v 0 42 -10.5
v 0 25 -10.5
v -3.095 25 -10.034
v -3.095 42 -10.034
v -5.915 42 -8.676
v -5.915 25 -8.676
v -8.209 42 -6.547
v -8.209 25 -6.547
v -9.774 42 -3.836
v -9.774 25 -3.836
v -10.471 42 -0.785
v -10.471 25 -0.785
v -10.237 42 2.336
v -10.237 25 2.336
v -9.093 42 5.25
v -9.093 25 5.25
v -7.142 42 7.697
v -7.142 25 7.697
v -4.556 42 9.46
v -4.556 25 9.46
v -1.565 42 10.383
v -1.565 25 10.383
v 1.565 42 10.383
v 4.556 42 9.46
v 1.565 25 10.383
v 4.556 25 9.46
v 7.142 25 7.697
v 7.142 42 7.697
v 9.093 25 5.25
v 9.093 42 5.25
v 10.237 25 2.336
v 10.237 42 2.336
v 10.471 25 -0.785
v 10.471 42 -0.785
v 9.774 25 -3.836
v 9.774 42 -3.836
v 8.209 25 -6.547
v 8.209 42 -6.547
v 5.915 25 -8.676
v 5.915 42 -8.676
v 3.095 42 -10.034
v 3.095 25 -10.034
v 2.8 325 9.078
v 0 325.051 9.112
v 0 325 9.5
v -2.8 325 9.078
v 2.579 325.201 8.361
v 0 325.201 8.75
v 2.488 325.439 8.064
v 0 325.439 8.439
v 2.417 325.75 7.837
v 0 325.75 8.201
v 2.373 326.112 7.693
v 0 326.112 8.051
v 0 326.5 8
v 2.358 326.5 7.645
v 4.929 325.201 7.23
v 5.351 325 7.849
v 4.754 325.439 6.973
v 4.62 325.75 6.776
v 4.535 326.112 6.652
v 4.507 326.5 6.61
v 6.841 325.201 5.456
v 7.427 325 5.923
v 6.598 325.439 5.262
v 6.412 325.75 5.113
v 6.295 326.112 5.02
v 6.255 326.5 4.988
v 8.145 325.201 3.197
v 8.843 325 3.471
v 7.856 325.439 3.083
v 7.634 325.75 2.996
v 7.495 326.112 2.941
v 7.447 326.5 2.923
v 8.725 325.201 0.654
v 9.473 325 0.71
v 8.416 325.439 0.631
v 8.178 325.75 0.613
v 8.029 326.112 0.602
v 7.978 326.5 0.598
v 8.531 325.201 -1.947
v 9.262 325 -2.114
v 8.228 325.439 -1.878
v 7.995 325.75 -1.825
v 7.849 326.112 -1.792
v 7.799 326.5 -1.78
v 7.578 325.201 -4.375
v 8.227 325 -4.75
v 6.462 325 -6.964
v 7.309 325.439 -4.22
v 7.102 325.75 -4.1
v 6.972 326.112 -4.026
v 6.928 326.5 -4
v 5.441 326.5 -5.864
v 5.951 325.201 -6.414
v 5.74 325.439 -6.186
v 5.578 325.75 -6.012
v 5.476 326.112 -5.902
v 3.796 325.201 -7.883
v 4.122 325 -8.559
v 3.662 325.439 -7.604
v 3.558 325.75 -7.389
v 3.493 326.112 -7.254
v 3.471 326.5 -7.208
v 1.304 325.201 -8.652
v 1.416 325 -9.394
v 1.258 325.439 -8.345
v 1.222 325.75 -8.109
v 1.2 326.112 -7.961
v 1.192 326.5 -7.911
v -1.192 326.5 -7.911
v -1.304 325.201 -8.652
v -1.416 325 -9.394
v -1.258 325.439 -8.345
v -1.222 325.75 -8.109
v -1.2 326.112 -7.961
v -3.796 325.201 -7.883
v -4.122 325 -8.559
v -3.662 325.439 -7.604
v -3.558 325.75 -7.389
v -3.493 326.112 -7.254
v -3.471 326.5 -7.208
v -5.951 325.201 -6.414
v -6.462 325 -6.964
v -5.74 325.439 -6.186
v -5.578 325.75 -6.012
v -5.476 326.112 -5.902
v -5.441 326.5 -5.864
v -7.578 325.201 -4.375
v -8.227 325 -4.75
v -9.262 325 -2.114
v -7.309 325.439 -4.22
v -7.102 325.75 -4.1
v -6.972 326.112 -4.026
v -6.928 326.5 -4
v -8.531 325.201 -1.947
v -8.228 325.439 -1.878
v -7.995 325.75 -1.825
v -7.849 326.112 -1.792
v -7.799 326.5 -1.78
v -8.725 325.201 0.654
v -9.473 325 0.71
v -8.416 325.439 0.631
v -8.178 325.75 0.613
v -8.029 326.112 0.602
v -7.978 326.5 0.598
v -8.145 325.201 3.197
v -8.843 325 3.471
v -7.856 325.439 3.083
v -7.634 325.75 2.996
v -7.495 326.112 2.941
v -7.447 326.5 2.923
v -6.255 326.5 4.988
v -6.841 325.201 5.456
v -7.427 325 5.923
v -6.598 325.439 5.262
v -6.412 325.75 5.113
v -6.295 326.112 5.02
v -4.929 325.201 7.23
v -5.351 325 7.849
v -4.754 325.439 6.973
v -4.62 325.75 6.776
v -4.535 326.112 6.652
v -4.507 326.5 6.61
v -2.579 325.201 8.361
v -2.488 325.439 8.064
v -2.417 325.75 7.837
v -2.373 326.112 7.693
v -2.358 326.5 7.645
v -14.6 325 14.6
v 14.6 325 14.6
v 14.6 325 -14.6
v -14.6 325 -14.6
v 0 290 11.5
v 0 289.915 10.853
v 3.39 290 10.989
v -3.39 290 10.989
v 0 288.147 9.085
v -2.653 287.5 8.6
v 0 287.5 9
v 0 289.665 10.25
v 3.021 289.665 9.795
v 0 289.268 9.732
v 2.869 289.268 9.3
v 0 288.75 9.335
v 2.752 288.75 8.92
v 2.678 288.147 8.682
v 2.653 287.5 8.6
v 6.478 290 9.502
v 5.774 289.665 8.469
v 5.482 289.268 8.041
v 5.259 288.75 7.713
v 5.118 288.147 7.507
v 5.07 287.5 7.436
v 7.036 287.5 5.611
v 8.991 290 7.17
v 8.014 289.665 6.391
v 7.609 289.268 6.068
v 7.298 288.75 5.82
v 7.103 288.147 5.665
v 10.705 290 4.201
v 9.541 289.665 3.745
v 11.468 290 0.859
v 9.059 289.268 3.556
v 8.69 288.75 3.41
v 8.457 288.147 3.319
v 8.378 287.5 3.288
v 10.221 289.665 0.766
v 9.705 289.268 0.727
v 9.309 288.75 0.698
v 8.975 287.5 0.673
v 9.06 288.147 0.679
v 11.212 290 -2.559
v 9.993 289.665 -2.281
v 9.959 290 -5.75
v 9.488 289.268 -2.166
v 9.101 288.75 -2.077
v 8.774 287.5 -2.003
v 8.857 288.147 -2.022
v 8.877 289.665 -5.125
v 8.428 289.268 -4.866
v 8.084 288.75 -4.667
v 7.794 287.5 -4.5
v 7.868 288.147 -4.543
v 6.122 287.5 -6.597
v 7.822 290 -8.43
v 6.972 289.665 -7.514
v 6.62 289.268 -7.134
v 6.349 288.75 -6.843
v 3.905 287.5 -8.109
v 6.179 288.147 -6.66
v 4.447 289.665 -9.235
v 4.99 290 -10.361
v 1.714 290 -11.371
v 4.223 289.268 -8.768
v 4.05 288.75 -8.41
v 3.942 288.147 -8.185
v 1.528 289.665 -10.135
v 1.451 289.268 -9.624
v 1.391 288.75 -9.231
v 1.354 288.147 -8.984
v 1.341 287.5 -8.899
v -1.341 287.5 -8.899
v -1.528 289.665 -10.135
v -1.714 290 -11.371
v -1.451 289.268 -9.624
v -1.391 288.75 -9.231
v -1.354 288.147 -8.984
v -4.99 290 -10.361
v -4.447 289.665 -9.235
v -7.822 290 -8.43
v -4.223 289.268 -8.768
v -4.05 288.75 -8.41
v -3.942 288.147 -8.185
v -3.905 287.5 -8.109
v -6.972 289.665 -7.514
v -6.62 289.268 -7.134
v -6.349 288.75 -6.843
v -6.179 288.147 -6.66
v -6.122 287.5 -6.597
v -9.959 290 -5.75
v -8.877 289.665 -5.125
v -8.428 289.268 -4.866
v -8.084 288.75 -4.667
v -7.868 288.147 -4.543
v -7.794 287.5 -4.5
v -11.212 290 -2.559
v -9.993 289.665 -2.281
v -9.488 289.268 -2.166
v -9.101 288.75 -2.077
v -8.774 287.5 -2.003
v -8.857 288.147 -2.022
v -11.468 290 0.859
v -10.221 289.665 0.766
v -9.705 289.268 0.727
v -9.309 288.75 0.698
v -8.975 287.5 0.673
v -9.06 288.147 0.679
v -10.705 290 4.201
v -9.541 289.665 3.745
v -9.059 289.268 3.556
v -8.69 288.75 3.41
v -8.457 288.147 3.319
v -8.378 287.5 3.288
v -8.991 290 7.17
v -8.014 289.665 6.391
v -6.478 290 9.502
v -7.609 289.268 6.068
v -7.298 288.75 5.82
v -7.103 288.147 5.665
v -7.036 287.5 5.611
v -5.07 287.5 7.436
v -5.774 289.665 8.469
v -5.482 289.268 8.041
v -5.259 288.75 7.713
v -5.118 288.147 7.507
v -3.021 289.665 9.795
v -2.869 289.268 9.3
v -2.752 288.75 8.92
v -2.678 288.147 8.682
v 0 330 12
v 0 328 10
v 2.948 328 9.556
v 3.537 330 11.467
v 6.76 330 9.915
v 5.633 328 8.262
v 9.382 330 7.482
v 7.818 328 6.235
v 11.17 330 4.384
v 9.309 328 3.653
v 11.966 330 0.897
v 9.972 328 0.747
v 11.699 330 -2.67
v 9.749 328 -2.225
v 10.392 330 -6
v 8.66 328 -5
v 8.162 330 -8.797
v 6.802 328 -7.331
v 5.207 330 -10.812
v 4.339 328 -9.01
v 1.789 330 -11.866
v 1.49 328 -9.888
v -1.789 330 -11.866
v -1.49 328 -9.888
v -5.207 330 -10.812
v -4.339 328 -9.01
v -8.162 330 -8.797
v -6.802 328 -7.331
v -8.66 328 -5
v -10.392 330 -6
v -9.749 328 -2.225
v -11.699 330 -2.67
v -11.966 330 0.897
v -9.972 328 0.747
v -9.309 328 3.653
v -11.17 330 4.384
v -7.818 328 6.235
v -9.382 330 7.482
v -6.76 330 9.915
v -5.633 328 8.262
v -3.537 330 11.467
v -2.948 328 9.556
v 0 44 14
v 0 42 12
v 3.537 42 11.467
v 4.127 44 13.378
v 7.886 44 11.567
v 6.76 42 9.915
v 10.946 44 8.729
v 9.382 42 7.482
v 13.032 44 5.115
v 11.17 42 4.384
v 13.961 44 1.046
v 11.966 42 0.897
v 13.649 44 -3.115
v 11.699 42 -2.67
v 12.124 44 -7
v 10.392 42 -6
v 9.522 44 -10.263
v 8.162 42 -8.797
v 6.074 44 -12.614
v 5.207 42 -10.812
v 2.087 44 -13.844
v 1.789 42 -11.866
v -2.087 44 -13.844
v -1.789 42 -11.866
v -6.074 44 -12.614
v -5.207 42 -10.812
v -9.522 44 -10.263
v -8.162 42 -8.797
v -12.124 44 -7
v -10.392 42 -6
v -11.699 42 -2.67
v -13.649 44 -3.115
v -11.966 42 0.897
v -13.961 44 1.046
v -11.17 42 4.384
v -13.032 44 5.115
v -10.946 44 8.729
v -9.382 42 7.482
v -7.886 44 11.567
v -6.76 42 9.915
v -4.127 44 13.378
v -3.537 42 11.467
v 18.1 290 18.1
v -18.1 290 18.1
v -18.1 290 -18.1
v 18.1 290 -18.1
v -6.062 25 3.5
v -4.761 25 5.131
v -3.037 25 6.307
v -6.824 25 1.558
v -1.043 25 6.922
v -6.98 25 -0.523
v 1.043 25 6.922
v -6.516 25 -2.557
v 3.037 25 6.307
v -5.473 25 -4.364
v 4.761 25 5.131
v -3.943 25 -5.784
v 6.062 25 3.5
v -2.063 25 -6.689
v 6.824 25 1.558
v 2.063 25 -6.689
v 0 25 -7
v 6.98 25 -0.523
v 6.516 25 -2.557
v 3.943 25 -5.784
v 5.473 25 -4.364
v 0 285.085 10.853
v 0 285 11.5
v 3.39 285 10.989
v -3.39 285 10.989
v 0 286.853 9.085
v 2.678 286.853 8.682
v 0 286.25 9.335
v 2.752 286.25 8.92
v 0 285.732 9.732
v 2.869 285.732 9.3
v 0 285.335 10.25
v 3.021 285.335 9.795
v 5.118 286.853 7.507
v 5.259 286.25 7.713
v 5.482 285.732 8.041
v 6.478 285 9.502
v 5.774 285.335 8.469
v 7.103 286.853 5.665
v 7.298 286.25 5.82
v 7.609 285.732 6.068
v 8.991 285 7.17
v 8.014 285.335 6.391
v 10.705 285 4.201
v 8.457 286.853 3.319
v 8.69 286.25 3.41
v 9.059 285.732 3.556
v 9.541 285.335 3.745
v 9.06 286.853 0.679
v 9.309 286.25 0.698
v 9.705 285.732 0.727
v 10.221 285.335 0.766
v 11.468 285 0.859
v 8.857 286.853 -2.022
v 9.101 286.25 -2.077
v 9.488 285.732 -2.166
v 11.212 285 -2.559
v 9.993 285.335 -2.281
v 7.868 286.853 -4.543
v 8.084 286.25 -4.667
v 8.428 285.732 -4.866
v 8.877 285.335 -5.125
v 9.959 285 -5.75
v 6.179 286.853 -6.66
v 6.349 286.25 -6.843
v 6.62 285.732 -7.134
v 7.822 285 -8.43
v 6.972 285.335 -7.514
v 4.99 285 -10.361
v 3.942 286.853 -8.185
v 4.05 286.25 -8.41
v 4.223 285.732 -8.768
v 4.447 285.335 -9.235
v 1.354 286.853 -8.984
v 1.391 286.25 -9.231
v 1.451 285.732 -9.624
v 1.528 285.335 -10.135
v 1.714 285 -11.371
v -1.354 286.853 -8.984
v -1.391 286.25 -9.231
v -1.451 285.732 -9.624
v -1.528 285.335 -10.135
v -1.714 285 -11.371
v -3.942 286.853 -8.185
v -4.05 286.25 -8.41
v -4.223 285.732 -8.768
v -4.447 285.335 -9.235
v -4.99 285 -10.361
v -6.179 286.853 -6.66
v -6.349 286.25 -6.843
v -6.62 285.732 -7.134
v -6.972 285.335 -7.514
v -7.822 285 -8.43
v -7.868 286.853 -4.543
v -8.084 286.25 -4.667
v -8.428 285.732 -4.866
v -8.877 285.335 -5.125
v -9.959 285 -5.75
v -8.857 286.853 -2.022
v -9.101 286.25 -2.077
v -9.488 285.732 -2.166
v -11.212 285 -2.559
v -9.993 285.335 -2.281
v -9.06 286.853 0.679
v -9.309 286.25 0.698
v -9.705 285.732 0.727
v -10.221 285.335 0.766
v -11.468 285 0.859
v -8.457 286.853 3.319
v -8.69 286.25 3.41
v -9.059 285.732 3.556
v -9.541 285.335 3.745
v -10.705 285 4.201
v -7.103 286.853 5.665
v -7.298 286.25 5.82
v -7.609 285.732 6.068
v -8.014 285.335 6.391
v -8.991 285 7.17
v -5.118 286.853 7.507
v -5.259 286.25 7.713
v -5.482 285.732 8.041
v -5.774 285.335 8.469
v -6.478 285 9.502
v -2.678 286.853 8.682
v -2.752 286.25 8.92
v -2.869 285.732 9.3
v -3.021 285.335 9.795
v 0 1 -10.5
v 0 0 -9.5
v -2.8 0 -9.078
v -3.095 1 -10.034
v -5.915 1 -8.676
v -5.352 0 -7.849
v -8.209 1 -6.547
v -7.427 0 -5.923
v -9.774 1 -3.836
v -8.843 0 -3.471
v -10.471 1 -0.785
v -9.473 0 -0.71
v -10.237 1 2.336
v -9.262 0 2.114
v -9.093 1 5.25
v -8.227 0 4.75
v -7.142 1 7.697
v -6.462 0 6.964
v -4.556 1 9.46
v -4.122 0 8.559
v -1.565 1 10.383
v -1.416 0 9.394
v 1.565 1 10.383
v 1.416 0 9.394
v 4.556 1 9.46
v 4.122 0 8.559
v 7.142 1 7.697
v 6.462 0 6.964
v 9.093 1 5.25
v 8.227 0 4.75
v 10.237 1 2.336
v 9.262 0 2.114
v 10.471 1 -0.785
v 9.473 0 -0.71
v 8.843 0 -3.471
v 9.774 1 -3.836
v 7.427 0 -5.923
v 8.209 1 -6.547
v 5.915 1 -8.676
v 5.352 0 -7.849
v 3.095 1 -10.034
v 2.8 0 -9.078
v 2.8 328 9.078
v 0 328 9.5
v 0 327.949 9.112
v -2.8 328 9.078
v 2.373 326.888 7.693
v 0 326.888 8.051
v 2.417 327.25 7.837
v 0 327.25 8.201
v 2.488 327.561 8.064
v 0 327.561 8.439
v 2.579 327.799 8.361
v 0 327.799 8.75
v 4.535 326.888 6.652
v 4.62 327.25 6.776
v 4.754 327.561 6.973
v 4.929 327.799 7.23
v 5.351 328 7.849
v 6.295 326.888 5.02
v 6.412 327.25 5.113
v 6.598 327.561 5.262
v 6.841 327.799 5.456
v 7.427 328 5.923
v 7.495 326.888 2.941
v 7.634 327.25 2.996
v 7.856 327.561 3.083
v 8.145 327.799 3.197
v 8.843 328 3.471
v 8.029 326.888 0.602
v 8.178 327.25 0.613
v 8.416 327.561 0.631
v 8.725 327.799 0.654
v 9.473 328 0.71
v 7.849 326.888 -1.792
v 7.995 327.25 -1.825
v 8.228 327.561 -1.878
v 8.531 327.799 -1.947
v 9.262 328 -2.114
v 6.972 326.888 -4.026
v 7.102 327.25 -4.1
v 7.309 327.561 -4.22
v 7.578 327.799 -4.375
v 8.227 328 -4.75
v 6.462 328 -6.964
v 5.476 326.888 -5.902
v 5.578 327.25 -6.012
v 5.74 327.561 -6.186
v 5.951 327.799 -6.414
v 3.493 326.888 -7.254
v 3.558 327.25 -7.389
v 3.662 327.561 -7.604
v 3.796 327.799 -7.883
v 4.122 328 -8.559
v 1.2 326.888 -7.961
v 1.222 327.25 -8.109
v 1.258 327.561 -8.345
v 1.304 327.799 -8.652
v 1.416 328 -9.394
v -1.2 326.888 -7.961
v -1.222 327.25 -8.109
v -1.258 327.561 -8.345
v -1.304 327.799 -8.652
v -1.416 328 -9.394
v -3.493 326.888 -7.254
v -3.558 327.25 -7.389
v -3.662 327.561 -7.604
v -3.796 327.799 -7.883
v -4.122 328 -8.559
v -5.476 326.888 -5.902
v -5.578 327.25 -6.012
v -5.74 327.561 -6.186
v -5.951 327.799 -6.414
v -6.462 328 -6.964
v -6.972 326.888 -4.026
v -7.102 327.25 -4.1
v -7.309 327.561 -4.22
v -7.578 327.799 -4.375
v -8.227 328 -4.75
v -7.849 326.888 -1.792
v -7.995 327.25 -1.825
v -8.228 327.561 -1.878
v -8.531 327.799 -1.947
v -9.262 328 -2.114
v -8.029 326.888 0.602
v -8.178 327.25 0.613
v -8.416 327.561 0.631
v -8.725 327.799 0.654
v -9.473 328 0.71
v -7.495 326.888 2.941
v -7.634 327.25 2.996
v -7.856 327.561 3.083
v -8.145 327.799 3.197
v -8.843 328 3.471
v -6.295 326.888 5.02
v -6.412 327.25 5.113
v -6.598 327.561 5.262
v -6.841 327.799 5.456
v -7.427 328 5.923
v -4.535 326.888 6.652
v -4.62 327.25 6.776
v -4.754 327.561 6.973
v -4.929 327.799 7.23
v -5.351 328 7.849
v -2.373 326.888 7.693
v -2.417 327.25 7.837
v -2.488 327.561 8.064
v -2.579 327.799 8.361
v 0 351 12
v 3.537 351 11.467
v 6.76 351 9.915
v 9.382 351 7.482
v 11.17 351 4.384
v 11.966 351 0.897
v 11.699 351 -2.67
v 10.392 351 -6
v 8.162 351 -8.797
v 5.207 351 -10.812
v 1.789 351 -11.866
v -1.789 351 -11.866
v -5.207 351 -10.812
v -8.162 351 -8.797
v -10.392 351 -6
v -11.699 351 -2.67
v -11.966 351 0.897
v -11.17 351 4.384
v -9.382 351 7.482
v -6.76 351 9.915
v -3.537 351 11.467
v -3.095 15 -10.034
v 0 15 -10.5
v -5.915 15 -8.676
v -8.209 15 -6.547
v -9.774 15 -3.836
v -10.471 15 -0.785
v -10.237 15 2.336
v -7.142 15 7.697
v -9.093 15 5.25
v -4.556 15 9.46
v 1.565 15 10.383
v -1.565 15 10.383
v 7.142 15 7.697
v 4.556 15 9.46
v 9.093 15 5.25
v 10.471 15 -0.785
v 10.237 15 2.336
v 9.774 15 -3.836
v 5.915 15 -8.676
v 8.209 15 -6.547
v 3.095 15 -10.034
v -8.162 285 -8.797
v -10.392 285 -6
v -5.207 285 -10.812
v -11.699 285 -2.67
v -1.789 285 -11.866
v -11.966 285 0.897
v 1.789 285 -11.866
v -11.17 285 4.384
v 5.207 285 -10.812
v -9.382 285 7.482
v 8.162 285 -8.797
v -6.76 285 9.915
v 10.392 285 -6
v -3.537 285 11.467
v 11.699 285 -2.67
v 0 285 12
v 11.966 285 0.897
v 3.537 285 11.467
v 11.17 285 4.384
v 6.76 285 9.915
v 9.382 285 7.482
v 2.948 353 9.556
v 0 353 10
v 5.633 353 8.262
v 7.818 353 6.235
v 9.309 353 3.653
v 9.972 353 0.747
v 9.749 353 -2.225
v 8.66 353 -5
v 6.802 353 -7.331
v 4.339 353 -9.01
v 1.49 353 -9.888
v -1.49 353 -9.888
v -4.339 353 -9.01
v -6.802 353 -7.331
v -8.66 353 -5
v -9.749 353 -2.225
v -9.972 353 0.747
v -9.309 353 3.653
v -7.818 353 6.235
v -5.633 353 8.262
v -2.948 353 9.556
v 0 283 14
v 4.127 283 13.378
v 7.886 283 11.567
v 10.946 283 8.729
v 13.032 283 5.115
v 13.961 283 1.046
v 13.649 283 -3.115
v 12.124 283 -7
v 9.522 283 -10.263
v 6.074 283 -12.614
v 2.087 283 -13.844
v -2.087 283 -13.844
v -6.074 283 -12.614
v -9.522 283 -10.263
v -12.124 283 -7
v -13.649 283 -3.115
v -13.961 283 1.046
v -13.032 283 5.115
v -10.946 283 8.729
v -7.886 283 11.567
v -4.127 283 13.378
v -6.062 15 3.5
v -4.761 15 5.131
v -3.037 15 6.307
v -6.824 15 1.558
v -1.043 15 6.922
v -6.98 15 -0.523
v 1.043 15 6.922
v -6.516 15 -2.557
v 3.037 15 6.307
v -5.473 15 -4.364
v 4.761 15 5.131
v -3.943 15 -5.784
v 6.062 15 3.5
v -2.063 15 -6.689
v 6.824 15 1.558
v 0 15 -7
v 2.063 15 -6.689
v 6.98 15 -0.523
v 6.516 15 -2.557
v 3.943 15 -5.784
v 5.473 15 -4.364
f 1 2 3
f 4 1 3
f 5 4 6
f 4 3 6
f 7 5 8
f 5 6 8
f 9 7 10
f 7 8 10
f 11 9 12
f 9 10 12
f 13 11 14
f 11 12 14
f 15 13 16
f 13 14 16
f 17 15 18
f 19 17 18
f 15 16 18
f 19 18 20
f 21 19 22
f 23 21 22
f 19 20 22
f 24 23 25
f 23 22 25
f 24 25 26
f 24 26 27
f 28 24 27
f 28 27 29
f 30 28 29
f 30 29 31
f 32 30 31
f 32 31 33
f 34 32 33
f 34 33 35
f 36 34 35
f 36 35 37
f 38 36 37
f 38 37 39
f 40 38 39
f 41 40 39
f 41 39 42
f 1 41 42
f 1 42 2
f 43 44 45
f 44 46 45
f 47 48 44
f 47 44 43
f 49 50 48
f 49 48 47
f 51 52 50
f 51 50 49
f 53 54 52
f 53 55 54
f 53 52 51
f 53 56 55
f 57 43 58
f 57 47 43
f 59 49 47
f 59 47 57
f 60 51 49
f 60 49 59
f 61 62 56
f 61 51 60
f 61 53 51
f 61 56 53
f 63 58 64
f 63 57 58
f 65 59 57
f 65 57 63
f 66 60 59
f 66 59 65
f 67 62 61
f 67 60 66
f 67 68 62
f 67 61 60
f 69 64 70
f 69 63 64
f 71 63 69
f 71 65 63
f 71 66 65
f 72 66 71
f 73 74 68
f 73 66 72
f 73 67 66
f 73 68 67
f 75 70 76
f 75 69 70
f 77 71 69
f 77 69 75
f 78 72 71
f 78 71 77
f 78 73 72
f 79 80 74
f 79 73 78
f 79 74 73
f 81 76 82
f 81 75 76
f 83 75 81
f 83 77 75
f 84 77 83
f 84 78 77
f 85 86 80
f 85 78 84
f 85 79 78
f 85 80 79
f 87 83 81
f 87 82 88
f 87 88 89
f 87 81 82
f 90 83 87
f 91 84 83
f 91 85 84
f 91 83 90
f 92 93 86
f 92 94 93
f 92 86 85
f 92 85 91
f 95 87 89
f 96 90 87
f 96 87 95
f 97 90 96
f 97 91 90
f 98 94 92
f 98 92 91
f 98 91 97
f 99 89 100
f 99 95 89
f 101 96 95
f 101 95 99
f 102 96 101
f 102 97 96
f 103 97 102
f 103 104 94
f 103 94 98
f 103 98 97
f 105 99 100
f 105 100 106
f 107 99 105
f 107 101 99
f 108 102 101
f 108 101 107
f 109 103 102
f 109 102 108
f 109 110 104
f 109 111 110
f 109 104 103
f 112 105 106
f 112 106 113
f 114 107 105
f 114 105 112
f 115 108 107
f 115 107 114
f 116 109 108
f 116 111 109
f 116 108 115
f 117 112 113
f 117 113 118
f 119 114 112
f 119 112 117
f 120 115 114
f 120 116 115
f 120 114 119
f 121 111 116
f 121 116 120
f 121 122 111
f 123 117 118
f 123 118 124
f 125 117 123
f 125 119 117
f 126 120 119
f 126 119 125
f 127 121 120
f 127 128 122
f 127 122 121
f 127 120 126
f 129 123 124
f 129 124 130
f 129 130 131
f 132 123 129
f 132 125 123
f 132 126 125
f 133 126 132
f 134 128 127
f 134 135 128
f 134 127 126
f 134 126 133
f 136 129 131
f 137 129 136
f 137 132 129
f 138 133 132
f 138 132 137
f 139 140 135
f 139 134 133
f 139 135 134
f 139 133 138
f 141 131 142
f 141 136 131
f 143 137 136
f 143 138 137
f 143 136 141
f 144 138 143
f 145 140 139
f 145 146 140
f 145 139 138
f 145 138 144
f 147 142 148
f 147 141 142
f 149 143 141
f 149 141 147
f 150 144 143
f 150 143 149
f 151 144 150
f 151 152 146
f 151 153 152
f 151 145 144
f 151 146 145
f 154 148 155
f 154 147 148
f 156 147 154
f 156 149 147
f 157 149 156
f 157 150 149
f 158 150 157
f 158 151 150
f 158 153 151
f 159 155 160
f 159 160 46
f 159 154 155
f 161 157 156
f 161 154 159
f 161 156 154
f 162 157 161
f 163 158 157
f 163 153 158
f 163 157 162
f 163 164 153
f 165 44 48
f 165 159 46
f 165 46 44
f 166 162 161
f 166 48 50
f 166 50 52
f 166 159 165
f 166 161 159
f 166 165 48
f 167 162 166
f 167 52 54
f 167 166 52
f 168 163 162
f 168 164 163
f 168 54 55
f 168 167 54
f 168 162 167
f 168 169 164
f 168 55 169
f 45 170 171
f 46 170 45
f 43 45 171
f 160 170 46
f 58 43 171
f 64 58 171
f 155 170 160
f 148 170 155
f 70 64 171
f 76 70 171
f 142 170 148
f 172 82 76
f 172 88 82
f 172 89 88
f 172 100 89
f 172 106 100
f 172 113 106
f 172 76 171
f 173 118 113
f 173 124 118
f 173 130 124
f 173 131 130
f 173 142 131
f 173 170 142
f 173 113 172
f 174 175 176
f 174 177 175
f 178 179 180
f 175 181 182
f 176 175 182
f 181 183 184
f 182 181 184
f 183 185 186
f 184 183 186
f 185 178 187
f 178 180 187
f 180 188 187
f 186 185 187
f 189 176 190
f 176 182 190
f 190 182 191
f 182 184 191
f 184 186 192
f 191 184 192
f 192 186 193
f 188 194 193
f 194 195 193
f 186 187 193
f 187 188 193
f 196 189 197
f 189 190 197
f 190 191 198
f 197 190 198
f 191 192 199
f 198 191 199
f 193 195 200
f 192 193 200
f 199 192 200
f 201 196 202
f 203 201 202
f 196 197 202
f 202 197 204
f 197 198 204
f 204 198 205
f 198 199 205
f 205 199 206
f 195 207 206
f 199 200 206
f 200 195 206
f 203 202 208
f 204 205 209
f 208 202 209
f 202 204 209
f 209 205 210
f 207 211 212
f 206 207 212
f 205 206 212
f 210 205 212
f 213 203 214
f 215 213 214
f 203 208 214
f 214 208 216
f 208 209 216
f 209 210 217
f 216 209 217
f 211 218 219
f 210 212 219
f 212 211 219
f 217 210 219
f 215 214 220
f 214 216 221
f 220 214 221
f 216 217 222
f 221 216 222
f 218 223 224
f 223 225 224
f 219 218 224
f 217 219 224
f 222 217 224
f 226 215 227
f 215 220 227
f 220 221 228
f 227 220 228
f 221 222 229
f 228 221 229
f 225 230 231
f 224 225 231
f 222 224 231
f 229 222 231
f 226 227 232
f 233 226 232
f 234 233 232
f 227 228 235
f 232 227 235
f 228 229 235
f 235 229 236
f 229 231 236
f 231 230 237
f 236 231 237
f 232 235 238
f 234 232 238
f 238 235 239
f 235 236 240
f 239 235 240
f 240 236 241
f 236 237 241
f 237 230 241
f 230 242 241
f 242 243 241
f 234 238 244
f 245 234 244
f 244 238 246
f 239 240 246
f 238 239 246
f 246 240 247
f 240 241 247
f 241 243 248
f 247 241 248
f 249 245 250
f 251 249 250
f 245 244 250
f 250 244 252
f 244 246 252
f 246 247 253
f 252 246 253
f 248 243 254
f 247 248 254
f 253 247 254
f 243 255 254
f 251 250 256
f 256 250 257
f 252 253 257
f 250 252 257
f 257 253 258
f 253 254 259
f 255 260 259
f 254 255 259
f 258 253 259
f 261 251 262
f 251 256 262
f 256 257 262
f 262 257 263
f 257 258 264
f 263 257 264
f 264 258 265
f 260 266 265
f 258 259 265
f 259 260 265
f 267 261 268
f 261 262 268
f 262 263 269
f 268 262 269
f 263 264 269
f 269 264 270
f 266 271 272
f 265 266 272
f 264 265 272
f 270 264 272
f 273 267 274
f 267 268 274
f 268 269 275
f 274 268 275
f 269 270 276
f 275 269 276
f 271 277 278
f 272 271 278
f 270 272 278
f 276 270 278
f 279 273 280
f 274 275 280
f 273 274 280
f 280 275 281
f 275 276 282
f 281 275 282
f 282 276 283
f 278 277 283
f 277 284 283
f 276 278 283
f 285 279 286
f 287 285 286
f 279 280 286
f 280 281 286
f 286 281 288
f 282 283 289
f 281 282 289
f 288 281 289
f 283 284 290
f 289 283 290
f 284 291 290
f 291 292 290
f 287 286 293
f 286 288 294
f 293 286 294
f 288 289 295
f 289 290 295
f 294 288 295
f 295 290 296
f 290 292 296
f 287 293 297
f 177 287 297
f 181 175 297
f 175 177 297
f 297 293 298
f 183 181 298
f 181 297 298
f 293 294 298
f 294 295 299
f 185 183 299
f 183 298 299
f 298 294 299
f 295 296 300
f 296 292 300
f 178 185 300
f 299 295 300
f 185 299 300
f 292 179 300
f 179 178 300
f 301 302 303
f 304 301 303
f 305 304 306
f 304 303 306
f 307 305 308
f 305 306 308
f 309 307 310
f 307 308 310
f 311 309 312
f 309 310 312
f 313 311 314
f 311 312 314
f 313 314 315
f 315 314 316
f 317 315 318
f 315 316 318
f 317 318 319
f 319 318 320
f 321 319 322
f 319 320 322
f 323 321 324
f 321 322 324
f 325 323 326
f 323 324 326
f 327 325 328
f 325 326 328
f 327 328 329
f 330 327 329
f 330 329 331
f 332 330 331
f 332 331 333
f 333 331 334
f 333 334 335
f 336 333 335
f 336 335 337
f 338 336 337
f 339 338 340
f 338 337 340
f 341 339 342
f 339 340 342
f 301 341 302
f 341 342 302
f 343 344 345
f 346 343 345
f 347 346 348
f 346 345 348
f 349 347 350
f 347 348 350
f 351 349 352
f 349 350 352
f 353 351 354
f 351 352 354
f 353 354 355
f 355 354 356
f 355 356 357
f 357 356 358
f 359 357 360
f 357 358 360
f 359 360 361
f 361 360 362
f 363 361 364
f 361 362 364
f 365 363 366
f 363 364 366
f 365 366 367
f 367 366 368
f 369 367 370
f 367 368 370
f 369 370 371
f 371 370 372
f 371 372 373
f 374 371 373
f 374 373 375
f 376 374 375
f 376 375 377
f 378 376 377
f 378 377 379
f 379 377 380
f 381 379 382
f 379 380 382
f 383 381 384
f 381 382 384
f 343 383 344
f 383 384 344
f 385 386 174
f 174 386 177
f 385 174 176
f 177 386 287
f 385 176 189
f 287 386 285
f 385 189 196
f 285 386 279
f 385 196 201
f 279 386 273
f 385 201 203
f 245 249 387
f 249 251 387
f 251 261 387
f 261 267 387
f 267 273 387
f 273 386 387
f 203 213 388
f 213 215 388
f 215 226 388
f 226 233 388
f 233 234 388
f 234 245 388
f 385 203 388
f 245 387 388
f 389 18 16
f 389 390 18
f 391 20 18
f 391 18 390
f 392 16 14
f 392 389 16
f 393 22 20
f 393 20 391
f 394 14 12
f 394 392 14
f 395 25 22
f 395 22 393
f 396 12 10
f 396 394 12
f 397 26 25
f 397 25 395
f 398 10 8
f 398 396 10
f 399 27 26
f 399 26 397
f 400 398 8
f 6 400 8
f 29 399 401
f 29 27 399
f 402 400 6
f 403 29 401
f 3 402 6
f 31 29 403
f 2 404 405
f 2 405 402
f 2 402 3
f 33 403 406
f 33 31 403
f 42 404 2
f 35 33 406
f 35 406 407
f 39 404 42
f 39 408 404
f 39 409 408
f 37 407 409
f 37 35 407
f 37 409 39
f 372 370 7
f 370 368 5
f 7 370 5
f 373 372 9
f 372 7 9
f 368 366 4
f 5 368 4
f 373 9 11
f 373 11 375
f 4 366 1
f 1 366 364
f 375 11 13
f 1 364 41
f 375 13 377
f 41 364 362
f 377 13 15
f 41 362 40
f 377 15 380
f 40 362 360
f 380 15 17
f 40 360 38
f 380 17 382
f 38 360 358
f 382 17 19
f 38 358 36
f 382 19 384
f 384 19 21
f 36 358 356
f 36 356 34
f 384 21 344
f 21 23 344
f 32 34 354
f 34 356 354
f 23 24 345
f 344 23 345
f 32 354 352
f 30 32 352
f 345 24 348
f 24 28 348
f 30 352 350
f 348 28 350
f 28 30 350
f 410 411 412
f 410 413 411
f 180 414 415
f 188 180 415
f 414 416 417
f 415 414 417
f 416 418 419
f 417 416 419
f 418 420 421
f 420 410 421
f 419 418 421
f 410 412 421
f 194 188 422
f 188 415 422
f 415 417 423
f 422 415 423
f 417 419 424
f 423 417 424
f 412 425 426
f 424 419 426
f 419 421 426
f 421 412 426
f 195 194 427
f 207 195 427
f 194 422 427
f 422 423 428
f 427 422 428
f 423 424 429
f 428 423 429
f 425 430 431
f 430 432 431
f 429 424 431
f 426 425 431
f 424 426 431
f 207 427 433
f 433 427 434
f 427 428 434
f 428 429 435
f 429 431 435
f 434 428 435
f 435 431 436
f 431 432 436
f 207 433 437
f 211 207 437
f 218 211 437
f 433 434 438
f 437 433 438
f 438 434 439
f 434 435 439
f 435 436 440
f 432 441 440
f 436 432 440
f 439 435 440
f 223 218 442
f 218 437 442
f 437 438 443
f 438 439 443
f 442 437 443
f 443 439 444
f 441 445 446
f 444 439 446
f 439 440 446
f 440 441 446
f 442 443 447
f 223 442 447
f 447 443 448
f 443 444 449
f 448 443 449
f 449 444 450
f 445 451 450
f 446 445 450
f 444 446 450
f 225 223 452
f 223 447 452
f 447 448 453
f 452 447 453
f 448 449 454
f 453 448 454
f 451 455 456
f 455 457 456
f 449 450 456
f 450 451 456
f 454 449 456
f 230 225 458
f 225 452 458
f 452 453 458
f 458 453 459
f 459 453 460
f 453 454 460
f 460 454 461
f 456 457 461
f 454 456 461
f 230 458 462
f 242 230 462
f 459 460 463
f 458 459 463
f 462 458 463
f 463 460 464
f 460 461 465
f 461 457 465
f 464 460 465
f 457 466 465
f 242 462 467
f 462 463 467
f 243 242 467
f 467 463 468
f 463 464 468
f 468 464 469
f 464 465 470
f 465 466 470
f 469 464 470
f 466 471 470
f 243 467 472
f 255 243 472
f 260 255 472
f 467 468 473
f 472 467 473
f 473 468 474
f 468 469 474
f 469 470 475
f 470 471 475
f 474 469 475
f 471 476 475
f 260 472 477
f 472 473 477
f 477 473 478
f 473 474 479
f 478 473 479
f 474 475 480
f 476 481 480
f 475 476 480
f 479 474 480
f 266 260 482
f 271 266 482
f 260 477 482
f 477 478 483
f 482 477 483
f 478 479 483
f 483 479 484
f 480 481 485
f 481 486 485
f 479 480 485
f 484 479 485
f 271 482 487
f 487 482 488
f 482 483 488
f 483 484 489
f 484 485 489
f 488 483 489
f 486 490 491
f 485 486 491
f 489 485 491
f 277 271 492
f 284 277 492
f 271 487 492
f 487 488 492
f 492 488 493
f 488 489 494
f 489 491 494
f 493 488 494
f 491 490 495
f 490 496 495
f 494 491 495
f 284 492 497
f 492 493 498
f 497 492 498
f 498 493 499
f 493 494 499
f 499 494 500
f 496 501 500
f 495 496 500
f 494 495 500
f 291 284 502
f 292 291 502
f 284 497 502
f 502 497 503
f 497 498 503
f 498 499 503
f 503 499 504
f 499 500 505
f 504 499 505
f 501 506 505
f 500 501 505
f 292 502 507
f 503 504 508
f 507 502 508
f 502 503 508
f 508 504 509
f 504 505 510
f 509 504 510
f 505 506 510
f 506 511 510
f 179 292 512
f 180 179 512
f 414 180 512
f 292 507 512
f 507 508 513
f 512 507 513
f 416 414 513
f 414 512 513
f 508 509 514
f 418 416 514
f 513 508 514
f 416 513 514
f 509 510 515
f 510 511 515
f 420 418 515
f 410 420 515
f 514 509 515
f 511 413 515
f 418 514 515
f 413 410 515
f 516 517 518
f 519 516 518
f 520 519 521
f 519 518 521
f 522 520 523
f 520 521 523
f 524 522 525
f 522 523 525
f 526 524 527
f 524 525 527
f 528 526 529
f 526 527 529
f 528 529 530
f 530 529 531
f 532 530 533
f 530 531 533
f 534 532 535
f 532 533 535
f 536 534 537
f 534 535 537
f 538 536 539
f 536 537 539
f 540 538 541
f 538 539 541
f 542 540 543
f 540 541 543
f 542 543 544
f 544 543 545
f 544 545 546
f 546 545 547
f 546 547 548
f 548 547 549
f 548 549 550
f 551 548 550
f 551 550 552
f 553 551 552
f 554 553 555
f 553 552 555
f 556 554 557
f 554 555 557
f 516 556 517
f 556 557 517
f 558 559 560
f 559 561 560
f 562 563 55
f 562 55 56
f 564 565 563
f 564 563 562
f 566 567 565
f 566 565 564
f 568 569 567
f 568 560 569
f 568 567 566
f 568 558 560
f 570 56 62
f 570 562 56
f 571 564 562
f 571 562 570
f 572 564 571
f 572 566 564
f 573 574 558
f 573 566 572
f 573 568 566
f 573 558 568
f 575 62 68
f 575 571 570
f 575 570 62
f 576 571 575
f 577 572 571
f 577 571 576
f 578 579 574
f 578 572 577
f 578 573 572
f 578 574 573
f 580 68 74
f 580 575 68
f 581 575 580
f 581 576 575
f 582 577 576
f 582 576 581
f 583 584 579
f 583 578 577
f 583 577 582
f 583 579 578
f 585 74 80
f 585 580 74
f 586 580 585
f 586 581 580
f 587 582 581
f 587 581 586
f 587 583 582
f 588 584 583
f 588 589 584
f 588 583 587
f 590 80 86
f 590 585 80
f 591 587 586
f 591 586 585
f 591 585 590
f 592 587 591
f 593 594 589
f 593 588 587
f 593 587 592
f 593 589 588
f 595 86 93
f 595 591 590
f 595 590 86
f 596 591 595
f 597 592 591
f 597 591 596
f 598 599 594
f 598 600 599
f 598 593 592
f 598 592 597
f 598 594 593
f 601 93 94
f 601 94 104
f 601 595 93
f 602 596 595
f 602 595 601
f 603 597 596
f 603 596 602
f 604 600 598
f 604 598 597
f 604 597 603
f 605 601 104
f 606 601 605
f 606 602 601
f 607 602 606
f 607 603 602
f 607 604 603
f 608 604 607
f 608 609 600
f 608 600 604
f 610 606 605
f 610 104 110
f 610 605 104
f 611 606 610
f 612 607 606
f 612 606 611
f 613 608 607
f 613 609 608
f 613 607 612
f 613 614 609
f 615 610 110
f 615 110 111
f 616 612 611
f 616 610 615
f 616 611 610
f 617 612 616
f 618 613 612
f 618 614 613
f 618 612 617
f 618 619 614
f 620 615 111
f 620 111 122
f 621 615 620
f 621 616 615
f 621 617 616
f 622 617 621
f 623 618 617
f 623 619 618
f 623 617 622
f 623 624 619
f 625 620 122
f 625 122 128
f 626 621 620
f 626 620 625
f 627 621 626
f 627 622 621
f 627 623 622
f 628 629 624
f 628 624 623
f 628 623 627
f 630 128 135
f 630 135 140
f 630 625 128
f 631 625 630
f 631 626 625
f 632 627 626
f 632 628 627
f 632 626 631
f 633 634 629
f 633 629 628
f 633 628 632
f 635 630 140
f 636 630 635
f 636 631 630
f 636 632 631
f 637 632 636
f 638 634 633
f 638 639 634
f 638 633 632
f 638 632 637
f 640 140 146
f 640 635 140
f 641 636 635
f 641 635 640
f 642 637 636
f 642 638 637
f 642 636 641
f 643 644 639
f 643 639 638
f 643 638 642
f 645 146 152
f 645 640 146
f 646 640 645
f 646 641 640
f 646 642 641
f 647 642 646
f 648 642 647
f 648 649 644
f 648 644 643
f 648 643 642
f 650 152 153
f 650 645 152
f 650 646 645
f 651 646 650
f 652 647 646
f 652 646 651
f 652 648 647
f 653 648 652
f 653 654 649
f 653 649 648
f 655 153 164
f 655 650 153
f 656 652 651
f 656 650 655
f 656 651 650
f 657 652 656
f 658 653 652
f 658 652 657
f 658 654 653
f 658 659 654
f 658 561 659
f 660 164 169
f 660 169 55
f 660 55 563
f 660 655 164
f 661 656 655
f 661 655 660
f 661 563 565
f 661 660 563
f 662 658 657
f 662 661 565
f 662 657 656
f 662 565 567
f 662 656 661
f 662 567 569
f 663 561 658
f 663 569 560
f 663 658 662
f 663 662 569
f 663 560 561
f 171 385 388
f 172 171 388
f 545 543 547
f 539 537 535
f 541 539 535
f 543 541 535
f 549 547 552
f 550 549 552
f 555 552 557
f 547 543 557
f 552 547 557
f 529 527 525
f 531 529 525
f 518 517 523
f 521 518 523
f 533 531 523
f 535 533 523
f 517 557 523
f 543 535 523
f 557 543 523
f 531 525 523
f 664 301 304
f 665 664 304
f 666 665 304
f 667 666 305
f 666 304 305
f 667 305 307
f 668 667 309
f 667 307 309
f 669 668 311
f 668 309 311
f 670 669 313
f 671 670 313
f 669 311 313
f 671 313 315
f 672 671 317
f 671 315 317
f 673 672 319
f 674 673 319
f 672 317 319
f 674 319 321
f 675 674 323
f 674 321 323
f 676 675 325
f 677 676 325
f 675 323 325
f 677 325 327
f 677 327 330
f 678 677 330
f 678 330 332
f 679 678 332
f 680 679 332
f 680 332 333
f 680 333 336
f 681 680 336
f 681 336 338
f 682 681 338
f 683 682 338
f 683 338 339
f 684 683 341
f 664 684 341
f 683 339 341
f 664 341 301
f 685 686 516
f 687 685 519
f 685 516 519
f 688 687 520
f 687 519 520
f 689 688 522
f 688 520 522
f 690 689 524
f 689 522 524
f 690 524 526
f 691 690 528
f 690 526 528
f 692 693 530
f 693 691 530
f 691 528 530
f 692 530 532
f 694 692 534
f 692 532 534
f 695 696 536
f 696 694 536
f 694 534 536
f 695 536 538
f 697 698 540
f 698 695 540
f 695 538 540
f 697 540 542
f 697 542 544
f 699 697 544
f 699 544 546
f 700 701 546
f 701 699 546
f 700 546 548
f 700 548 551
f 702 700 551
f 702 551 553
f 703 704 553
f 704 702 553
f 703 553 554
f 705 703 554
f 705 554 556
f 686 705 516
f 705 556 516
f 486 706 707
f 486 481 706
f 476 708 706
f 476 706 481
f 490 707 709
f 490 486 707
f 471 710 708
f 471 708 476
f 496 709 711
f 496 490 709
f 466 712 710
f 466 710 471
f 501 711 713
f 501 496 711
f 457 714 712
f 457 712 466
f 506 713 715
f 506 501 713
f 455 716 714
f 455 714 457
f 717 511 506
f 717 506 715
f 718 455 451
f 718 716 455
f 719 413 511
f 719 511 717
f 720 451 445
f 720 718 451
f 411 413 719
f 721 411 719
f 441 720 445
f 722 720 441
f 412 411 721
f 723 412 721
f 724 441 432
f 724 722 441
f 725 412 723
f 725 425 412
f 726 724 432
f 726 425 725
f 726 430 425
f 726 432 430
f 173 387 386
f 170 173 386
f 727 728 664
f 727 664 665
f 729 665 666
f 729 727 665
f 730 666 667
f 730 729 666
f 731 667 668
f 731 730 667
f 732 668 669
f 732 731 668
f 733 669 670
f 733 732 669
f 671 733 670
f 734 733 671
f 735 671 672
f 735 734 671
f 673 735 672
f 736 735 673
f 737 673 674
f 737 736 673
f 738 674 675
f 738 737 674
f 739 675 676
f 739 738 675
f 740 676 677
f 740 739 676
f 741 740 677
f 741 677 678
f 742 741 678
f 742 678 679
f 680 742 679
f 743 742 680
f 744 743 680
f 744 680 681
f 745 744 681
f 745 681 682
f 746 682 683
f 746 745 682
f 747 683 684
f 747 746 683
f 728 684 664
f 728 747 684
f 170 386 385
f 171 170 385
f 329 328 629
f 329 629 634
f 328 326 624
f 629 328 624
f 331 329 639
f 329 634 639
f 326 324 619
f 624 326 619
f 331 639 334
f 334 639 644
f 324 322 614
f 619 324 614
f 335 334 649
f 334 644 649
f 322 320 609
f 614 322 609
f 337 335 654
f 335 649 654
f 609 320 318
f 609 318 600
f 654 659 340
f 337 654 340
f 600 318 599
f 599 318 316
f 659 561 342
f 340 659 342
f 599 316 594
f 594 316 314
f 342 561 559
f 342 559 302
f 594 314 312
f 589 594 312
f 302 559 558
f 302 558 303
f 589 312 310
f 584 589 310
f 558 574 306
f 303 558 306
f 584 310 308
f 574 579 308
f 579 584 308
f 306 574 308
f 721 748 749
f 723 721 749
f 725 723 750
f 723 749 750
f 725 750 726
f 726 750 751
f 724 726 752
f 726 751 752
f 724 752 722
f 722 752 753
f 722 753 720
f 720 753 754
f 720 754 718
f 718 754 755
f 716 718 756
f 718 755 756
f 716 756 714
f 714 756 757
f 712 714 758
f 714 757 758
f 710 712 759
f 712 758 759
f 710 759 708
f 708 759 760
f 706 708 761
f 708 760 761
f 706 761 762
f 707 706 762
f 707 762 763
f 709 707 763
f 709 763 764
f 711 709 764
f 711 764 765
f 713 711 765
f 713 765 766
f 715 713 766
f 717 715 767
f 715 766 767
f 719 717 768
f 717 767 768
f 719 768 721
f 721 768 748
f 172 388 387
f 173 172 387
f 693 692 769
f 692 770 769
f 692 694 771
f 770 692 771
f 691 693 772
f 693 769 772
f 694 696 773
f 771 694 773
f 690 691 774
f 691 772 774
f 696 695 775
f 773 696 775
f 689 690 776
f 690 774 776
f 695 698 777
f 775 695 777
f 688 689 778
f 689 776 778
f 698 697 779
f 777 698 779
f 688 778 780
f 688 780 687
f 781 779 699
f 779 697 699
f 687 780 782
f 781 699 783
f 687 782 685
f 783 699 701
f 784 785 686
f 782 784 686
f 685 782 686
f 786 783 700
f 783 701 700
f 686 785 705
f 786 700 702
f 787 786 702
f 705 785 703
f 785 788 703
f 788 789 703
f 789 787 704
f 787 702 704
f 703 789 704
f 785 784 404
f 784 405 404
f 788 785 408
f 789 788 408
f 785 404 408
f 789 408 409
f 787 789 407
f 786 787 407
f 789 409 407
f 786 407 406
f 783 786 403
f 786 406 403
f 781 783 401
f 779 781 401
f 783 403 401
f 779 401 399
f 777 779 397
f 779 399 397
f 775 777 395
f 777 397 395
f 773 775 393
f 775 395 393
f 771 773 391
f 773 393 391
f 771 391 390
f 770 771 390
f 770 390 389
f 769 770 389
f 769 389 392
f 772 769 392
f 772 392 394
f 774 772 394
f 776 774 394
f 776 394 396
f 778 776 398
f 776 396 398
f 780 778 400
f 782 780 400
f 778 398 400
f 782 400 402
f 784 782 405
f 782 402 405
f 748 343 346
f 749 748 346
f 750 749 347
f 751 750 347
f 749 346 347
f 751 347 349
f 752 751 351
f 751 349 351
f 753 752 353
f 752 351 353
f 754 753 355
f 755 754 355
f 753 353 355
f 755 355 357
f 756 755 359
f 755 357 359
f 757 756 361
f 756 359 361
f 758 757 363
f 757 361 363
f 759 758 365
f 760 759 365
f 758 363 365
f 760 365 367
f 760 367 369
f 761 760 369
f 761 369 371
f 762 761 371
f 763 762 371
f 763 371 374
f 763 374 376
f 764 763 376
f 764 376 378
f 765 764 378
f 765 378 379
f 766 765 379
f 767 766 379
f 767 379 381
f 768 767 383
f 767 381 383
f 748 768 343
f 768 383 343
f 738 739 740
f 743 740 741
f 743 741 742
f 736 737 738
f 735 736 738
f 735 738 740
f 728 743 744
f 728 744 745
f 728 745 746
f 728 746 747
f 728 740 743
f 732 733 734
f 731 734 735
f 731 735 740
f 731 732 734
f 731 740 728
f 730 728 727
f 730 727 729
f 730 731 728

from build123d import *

# Parameters (mm, degrees)
SKETCH1_R           = 10.5
BOSS_EXTRUDE1_DEPTH = 42
SKETCH3_R           = 14
BOSS_EXTRUDE2_DEPTH = 243
SKETCH4_R           = 9
BOSS_EXTRUDE3_DEPTH = 5
SKETCH5_W           = 36.2
SKETCH5_H           = 36.2
BOSS_EXTRUDE4_DEPTH = 35
BOSS_EXTRUDE4_TAPER = 5.710593137
SKETCH6_R           = 8
BOSS_EXTRUDE6_DEPTH = 3
SKETCH7_R           = 12
BOSS_EXTRUDE7_DEPTH = 25
CHAMFER1_SIZE       = 2
FILLET2_R           = 2.5
SKETCH8_W           = 3.5
SKETCH8_H           = 10
CHAMFER2_SIZE       = 2
CHAMFER3_SIZE       = 1
FILLET3_R           = 1.5


with BuildPart() as part:
    # Sketch1 → Boss-Extrude1 (new body)
    with BuildSketch(Plane(origin=(0, 0, 0), x_dir=(1, 0, 0), z_dir=(0, 1, 0))):
        with Locations(Location((0, 0, 0), (0, 0, 90))):
            Circle(SKETCH1_R)
    extrude(amount=BOSS_EXTRUDE1_DEPTH)

    # Sketch3 → Boss-Extrude2 (add)
    with BuildSketch(Plane(origin=(0, 42, 0), x_dir=(1, 0, 0), z_dir=(0, 1, 0))):
        with Locations(Location((0, 0, 0), (0, 0, 270))):
            Circle(SKETCH3_R)
    extrude(amount=BOSS_EXTRUDE2_DEPTH)

    # Sketch4 → Boss-Extrude3 (add)
    with BuildSketch(Plane(origin=(0, 285, 0), x_dir=(1, 0, 0), z_dir=(0, 1, 0))):
        with Locations(Location((0, 0, 0), (0, 0, 270))):
            Circle(SKETCH4_R)
    extrude(amount=BOSS_EXTRUDE3_DEPTH)

    # Sketch5 → Boss-Extrude4 (add)
    with BuildSketch(Plane(origin=(0, 290, 0), x_dir=(1, 0, 0), z_dir=(0, 1, 0))):
        Rectangle(SKETCH5_W, SKETCH5_H)
    extrude(amount=BOSS_EXTRUDE4_DEPTH, taper=BOSS_EXTRUDE4_TAPER)

    # Sketch6 → Boss-Extrude6 (add)
    with BuildSketch(Plane(origin=(0, 325, 0), x_dir=(1, 0, 0), z_dir=(0, 1, 0))):
        with Locations(Location((0, 0, 0), (0, 0, 270))):
            Circle(SKETCH6_R)
    extrude(amount=BOSS_EXTRUDE6_DEPTH)

    # Sketch7 → Boss-Extrude7 (add)
    with BuildSketch(Plane(origin=(0, 328, 0), x_dir=(1, 0, 0), z_dir=(0, 1, 0))):
        with Locations(Location((0, 0, 0), (0, 0, 270))):
            Circle(SKETCH7_R)
    extrude(amount=BOSS_EXTRUDE7_DEPTH)

    # Chamfer1
    chamfer1_edges = [part.edges().sort_by_distance(p)[0] for p in [
        (0, 328, -12),
        (0, 353, -12),
    ]]
    chamfer(chamfer1_edges, length=CHAMFER1_SIZE)

    # Fillet2
    fillet2_edges = [part.edges().sort_by_distance(p)[0] for p in [
        (0, 290, -9),
        (0, 285, -9),
    ]]
    fillet(fillet2_edges, radius=FILLET2_R - 0.0001)  # a hair under: the kernel refuses the full size

    # Sketch8 → Cut-Revolve1 (revolve, cut)
    with BuildSketch(Plane.XY, mode=Mode.PRIVATE) as cut_revolve1_sk:
        with Locations((-8.75, 20)):
            Rectangle(SKETCH8_W, SKETCH8_H)
    revolve(cut_revolve1_sk.sketch.rotate(Axis((0, 42, 0), (0, -1, 0)), 90), axis=Axis((0, 42, 0), (0, -1, 0)), mode=Mode.SUBTRACT)

    # Chamfer2
    chamfer2_edges = [part.edges().sort_by_distance(p)[0] for p in [
        (0, 42, -14),
        (0, 285, -14),
    ]]
    chamfer(chamfer2_edges, length=CHAMFER2_SIZE)

    # Chamfer3
    chamfer3_edges = [part.edges().sort_by_distance(p)[0] for p in [
        (0, 0, 10.5),
    ]]
    chamfer(chamfer3_edges, length=CHAMFER3_SIZE)

    # Fillet3
    fillet3_edges = [part.edges().sort_by_distance(p)[0] for p in [
        (0, 325, -8),
        (0, 328, -8),
    ]]
    fillet(fillet3_edges, radius=FILLET3_R - 0.0001)  # a hair under: the kernel refuses the full size


solid = part.part
